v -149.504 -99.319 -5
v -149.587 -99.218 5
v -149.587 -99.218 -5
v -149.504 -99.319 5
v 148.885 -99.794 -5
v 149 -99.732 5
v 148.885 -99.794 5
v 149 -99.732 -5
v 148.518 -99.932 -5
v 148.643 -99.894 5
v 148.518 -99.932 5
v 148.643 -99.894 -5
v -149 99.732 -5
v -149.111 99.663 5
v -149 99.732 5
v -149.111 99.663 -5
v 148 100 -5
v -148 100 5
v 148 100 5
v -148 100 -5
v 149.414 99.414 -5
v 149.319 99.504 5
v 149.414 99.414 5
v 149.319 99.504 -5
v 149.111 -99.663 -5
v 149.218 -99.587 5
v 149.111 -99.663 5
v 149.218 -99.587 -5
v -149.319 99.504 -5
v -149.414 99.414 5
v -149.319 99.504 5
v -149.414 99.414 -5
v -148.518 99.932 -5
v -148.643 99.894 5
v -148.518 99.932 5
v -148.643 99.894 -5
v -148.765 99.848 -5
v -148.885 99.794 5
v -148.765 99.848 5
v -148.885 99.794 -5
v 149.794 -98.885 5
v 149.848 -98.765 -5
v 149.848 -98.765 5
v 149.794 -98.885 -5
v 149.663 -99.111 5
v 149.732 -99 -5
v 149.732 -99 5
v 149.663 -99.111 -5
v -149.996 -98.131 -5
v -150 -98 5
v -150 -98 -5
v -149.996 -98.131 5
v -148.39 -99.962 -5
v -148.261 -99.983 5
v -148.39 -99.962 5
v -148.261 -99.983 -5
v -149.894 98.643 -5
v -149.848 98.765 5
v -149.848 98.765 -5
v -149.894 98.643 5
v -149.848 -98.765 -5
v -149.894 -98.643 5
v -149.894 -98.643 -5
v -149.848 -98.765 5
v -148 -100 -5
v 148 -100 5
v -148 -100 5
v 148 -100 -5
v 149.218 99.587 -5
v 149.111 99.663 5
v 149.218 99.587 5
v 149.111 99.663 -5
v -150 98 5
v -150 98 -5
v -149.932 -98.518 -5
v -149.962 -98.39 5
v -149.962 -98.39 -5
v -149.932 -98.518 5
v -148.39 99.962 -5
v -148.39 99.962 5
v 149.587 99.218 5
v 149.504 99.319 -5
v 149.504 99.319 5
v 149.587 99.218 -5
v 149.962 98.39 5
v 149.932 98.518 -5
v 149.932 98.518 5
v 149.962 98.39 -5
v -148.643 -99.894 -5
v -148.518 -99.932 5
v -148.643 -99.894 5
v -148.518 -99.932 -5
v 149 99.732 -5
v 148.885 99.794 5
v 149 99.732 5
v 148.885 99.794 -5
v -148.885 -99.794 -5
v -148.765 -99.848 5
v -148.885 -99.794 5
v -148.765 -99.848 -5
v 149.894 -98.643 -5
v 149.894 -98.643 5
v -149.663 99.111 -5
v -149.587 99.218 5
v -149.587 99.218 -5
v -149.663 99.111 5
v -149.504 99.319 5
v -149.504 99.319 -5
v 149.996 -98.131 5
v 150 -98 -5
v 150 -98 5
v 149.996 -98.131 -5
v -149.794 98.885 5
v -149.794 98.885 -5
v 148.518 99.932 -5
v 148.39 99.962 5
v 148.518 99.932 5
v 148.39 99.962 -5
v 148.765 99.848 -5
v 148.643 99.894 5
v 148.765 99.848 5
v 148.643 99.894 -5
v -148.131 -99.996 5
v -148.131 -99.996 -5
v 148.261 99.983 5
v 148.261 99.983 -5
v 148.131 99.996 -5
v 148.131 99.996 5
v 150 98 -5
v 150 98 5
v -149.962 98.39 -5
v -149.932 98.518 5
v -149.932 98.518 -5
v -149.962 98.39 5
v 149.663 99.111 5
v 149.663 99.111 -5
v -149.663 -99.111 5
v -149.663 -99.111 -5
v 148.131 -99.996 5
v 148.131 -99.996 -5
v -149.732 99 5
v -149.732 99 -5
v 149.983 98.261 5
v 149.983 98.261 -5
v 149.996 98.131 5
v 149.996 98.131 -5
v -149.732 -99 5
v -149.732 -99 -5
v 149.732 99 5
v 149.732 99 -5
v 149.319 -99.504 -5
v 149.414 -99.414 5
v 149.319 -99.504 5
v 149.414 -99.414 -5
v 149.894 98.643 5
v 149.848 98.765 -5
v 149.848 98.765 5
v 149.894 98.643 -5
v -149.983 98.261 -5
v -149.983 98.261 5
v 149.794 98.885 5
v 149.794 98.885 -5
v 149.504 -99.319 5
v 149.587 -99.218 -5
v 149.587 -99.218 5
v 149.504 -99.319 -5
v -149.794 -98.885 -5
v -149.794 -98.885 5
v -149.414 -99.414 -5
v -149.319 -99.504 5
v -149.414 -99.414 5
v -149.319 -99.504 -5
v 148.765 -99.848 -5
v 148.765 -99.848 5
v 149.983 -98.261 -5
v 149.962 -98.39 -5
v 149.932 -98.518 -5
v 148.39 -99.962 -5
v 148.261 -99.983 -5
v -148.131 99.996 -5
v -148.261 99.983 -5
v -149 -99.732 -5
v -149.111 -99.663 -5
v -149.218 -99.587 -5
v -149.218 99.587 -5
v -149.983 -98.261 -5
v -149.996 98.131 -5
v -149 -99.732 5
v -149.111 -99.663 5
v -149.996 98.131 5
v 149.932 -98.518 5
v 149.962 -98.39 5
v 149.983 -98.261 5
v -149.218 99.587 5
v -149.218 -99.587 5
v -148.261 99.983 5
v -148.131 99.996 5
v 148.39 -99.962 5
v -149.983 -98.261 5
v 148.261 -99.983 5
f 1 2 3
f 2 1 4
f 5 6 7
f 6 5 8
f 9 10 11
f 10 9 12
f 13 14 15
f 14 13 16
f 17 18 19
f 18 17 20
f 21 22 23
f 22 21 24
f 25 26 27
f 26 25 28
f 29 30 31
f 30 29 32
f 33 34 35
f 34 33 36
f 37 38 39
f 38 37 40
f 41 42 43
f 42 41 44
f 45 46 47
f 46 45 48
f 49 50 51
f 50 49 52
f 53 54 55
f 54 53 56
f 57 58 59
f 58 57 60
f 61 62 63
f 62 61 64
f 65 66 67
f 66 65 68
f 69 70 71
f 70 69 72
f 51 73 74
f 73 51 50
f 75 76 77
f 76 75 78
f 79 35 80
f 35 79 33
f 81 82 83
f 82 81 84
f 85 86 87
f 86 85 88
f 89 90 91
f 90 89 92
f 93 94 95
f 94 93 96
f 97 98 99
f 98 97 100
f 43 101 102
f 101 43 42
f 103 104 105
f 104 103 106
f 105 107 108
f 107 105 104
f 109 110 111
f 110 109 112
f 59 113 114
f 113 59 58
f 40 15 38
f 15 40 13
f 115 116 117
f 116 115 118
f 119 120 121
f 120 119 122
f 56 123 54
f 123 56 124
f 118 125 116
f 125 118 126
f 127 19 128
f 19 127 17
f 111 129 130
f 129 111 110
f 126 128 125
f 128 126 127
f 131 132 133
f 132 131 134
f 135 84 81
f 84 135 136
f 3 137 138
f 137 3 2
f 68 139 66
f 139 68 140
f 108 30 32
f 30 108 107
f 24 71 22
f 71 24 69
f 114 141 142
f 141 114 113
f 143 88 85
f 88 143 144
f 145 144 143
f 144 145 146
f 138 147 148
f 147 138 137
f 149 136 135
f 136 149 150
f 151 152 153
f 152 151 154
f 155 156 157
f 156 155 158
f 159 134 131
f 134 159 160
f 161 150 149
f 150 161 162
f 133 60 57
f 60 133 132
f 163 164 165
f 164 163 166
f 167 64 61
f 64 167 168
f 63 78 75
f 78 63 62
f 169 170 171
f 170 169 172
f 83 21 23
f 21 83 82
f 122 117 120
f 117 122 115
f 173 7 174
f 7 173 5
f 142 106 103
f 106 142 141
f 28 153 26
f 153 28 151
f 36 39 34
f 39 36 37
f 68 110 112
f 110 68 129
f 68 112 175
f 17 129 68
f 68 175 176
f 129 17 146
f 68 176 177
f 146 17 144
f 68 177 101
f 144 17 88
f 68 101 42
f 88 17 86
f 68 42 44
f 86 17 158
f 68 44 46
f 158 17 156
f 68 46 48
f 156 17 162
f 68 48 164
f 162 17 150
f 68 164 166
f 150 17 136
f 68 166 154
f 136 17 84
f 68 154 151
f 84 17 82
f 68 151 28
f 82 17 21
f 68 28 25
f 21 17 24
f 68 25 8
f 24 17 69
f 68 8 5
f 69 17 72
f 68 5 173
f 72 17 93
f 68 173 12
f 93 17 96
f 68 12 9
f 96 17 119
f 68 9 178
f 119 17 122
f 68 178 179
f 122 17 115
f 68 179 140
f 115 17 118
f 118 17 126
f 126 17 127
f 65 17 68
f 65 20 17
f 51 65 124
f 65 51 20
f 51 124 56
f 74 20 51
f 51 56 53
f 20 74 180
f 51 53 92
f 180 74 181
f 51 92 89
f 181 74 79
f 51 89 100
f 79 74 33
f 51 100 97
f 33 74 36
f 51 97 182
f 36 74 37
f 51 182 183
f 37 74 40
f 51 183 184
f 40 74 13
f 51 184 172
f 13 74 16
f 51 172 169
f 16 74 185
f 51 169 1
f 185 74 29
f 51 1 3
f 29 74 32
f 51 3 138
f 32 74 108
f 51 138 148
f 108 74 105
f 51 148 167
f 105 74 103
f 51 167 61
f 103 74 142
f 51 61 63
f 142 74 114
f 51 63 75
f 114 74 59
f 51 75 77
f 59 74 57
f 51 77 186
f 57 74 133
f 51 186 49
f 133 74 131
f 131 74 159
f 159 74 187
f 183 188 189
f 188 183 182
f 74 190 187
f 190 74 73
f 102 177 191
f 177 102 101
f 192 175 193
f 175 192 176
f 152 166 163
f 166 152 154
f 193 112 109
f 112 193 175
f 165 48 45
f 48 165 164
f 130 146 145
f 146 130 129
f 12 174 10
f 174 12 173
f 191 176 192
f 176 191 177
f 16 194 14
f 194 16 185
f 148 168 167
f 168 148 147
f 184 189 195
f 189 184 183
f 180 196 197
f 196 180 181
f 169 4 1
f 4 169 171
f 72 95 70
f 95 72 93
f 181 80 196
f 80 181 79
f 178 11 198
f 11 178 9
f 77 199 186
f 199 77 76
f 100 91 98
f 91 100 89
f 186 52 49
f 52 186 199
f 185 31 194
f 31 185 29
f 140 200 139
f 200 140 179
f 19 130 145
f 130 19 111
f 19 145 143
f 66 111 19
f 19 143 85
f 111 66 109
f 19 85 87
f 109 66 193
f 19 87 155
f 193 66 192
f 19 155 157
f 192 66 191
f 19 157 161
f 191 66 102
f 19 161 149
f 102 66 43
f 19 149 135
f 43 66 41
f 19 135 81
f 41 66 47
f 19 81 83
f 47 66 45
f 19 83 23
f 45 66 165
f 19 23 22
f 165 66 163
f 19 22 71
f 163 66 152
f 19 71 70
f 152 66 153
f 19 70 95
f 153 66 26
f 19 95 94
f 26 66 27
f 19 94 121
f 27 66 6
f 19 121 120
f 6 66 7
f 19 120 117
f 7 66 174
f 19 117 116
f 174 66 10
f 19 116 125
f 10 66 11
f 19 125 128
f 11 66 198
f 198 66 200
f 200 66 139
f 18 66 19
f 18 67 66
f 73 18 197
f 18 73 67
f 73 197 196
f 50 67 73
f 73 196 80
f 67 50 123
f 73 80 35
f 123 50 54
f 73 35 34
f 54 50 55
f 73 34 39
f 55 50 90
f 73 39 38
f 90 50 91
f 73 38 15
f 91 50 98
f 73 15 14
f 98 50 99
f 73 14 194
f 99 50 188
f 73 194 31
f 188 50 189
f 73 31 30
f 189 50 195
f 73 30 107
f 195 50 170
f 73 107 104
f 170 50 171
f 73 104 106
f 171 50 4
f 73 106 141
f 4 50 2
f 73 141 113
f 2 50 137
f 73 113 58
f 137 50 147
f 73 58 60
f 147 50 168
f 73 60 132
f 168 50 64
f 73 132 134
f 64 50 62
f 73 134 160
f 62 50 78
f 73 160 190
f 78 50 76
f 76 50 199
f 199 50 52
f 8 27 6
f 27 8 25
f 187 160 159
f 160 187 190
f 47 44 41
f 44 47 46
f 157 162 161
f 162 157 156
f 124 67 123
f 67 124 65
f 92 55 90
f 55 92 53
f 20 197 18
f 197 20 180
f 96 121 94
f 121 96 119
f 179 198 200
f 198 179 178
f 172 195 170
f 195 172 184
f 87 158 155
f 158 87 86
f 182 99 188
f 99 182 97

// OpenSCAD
// Aluminium Tooling Plate (single connected solid, non-blank render)

// Parameters
plate_length = 300; //[150:600:1]
plate_width = 200;  //[100:400:1]
plate_thickness = 10; //[5:20:1]

edge_chamfer_size = 1; //[0.5:3:0.5]
corner_radius_value = 2; //[1:6:0.5]

surface_finish_depth = 0.2; //[0.1:0.5:0.05]
engraved_label_depth = 0.2; //[0.1:0.5:0.05]

connect_overlap = 1; //[0.5:2:0.5]
marking_band_width = 10; //[5:30:1]

$fn = 96;

// Helpers
function clamp(v, lo, hi) = v < lo ? lo : (v > hi ? hi : v);

// Robust 2D rounded rectangle (avoids offset degeneracy)
module rounded_rect_2d(L, W, R) {
    R2 = clamp(R, 0, min(L, W)/2);
    if (R2 <= 0) {
        square([L, W], center=true);
    } else {
        hull() {
            for (sx = [-1, 1], sy = [-1, 1])
                translate([sx*(L/2 - R2), sy*(W/2 - R2)])
                    circle(r=R2);
        }
    }
}

// Main plate with corner radii (single solid)
module plate_solid() {
    linear_extrude(height=plate_thickness, center=true, convexity=10)
        rounded_rect_2d(plate_length, plate_width, corner_radius_value);
}

// Subtle top band (solid addition, connected by overlap)
module top_edge_band() {
    band_h = min(edge_chamfer_size, plate_thickness);
    translate([0, 0, plate_thickness/2 - band_h/2 - connect_overlap/2])
        linear_extrude(height=band_h + connect_overlap, center=true, convexity=10)
            rounded_rect_2d(plate_length, plate_width, corner_radius_value);
}

// Subtle bottom band (solid addition, connected by overlap)
module bottom_edge_band() {
    band_h = min(edge_chamfer_size, plate_thickness);
    translate([0, 0, -plate_thickness/2 + band_h/2 + connect_overlap/2])
        linear_extrude(height=band_h + connect_overlap, center=true, convexity=10)
            rounded_rect_2d(plate_length, plate_width, corner_radius_value);
}

// Very shallow surface finish pad (solid addition, connected)
module surface_finish_pad() {
    pad_L = max(plate_length - 2*marking_band_width, 0.1);
    pad_W = max(plate_width  - 2*marking_band_width, 0.1);
    pad_h = min(surface_finish_depth, plate_thickness);

    translate([0, 0, plate_thickness/2 - pad_h/2 - connect_overlap/2])
        cube([pad_L, pad_W, pad_h + connect_overlap], center=true);
}

// Very shallow label pad (solid addition, connected)
module label_pad() {
    lab_L = plate_length/4;
    lab_W = plate_width/6;
    lab_h = min(engraved_label_depth, plate_thickness);

    x0 = -plate_length/2 + marking_band_width + lab_L/2;
    y0 = -plate_width/2  + marking_band_width + lab_W/2;

    translate([x0, y0, plate_thickness/2 - lab_h/2 - connect_overlap/2])
        cube([lab_L, lab_W, lab_h + connect_overlap], center=true);
}

// Final Output: ONE connected solid
union() {
    plate_solid();
    top_edge_band();
    bottom_edge_band();
    surface_finish_pad();
    label_pad();
}
